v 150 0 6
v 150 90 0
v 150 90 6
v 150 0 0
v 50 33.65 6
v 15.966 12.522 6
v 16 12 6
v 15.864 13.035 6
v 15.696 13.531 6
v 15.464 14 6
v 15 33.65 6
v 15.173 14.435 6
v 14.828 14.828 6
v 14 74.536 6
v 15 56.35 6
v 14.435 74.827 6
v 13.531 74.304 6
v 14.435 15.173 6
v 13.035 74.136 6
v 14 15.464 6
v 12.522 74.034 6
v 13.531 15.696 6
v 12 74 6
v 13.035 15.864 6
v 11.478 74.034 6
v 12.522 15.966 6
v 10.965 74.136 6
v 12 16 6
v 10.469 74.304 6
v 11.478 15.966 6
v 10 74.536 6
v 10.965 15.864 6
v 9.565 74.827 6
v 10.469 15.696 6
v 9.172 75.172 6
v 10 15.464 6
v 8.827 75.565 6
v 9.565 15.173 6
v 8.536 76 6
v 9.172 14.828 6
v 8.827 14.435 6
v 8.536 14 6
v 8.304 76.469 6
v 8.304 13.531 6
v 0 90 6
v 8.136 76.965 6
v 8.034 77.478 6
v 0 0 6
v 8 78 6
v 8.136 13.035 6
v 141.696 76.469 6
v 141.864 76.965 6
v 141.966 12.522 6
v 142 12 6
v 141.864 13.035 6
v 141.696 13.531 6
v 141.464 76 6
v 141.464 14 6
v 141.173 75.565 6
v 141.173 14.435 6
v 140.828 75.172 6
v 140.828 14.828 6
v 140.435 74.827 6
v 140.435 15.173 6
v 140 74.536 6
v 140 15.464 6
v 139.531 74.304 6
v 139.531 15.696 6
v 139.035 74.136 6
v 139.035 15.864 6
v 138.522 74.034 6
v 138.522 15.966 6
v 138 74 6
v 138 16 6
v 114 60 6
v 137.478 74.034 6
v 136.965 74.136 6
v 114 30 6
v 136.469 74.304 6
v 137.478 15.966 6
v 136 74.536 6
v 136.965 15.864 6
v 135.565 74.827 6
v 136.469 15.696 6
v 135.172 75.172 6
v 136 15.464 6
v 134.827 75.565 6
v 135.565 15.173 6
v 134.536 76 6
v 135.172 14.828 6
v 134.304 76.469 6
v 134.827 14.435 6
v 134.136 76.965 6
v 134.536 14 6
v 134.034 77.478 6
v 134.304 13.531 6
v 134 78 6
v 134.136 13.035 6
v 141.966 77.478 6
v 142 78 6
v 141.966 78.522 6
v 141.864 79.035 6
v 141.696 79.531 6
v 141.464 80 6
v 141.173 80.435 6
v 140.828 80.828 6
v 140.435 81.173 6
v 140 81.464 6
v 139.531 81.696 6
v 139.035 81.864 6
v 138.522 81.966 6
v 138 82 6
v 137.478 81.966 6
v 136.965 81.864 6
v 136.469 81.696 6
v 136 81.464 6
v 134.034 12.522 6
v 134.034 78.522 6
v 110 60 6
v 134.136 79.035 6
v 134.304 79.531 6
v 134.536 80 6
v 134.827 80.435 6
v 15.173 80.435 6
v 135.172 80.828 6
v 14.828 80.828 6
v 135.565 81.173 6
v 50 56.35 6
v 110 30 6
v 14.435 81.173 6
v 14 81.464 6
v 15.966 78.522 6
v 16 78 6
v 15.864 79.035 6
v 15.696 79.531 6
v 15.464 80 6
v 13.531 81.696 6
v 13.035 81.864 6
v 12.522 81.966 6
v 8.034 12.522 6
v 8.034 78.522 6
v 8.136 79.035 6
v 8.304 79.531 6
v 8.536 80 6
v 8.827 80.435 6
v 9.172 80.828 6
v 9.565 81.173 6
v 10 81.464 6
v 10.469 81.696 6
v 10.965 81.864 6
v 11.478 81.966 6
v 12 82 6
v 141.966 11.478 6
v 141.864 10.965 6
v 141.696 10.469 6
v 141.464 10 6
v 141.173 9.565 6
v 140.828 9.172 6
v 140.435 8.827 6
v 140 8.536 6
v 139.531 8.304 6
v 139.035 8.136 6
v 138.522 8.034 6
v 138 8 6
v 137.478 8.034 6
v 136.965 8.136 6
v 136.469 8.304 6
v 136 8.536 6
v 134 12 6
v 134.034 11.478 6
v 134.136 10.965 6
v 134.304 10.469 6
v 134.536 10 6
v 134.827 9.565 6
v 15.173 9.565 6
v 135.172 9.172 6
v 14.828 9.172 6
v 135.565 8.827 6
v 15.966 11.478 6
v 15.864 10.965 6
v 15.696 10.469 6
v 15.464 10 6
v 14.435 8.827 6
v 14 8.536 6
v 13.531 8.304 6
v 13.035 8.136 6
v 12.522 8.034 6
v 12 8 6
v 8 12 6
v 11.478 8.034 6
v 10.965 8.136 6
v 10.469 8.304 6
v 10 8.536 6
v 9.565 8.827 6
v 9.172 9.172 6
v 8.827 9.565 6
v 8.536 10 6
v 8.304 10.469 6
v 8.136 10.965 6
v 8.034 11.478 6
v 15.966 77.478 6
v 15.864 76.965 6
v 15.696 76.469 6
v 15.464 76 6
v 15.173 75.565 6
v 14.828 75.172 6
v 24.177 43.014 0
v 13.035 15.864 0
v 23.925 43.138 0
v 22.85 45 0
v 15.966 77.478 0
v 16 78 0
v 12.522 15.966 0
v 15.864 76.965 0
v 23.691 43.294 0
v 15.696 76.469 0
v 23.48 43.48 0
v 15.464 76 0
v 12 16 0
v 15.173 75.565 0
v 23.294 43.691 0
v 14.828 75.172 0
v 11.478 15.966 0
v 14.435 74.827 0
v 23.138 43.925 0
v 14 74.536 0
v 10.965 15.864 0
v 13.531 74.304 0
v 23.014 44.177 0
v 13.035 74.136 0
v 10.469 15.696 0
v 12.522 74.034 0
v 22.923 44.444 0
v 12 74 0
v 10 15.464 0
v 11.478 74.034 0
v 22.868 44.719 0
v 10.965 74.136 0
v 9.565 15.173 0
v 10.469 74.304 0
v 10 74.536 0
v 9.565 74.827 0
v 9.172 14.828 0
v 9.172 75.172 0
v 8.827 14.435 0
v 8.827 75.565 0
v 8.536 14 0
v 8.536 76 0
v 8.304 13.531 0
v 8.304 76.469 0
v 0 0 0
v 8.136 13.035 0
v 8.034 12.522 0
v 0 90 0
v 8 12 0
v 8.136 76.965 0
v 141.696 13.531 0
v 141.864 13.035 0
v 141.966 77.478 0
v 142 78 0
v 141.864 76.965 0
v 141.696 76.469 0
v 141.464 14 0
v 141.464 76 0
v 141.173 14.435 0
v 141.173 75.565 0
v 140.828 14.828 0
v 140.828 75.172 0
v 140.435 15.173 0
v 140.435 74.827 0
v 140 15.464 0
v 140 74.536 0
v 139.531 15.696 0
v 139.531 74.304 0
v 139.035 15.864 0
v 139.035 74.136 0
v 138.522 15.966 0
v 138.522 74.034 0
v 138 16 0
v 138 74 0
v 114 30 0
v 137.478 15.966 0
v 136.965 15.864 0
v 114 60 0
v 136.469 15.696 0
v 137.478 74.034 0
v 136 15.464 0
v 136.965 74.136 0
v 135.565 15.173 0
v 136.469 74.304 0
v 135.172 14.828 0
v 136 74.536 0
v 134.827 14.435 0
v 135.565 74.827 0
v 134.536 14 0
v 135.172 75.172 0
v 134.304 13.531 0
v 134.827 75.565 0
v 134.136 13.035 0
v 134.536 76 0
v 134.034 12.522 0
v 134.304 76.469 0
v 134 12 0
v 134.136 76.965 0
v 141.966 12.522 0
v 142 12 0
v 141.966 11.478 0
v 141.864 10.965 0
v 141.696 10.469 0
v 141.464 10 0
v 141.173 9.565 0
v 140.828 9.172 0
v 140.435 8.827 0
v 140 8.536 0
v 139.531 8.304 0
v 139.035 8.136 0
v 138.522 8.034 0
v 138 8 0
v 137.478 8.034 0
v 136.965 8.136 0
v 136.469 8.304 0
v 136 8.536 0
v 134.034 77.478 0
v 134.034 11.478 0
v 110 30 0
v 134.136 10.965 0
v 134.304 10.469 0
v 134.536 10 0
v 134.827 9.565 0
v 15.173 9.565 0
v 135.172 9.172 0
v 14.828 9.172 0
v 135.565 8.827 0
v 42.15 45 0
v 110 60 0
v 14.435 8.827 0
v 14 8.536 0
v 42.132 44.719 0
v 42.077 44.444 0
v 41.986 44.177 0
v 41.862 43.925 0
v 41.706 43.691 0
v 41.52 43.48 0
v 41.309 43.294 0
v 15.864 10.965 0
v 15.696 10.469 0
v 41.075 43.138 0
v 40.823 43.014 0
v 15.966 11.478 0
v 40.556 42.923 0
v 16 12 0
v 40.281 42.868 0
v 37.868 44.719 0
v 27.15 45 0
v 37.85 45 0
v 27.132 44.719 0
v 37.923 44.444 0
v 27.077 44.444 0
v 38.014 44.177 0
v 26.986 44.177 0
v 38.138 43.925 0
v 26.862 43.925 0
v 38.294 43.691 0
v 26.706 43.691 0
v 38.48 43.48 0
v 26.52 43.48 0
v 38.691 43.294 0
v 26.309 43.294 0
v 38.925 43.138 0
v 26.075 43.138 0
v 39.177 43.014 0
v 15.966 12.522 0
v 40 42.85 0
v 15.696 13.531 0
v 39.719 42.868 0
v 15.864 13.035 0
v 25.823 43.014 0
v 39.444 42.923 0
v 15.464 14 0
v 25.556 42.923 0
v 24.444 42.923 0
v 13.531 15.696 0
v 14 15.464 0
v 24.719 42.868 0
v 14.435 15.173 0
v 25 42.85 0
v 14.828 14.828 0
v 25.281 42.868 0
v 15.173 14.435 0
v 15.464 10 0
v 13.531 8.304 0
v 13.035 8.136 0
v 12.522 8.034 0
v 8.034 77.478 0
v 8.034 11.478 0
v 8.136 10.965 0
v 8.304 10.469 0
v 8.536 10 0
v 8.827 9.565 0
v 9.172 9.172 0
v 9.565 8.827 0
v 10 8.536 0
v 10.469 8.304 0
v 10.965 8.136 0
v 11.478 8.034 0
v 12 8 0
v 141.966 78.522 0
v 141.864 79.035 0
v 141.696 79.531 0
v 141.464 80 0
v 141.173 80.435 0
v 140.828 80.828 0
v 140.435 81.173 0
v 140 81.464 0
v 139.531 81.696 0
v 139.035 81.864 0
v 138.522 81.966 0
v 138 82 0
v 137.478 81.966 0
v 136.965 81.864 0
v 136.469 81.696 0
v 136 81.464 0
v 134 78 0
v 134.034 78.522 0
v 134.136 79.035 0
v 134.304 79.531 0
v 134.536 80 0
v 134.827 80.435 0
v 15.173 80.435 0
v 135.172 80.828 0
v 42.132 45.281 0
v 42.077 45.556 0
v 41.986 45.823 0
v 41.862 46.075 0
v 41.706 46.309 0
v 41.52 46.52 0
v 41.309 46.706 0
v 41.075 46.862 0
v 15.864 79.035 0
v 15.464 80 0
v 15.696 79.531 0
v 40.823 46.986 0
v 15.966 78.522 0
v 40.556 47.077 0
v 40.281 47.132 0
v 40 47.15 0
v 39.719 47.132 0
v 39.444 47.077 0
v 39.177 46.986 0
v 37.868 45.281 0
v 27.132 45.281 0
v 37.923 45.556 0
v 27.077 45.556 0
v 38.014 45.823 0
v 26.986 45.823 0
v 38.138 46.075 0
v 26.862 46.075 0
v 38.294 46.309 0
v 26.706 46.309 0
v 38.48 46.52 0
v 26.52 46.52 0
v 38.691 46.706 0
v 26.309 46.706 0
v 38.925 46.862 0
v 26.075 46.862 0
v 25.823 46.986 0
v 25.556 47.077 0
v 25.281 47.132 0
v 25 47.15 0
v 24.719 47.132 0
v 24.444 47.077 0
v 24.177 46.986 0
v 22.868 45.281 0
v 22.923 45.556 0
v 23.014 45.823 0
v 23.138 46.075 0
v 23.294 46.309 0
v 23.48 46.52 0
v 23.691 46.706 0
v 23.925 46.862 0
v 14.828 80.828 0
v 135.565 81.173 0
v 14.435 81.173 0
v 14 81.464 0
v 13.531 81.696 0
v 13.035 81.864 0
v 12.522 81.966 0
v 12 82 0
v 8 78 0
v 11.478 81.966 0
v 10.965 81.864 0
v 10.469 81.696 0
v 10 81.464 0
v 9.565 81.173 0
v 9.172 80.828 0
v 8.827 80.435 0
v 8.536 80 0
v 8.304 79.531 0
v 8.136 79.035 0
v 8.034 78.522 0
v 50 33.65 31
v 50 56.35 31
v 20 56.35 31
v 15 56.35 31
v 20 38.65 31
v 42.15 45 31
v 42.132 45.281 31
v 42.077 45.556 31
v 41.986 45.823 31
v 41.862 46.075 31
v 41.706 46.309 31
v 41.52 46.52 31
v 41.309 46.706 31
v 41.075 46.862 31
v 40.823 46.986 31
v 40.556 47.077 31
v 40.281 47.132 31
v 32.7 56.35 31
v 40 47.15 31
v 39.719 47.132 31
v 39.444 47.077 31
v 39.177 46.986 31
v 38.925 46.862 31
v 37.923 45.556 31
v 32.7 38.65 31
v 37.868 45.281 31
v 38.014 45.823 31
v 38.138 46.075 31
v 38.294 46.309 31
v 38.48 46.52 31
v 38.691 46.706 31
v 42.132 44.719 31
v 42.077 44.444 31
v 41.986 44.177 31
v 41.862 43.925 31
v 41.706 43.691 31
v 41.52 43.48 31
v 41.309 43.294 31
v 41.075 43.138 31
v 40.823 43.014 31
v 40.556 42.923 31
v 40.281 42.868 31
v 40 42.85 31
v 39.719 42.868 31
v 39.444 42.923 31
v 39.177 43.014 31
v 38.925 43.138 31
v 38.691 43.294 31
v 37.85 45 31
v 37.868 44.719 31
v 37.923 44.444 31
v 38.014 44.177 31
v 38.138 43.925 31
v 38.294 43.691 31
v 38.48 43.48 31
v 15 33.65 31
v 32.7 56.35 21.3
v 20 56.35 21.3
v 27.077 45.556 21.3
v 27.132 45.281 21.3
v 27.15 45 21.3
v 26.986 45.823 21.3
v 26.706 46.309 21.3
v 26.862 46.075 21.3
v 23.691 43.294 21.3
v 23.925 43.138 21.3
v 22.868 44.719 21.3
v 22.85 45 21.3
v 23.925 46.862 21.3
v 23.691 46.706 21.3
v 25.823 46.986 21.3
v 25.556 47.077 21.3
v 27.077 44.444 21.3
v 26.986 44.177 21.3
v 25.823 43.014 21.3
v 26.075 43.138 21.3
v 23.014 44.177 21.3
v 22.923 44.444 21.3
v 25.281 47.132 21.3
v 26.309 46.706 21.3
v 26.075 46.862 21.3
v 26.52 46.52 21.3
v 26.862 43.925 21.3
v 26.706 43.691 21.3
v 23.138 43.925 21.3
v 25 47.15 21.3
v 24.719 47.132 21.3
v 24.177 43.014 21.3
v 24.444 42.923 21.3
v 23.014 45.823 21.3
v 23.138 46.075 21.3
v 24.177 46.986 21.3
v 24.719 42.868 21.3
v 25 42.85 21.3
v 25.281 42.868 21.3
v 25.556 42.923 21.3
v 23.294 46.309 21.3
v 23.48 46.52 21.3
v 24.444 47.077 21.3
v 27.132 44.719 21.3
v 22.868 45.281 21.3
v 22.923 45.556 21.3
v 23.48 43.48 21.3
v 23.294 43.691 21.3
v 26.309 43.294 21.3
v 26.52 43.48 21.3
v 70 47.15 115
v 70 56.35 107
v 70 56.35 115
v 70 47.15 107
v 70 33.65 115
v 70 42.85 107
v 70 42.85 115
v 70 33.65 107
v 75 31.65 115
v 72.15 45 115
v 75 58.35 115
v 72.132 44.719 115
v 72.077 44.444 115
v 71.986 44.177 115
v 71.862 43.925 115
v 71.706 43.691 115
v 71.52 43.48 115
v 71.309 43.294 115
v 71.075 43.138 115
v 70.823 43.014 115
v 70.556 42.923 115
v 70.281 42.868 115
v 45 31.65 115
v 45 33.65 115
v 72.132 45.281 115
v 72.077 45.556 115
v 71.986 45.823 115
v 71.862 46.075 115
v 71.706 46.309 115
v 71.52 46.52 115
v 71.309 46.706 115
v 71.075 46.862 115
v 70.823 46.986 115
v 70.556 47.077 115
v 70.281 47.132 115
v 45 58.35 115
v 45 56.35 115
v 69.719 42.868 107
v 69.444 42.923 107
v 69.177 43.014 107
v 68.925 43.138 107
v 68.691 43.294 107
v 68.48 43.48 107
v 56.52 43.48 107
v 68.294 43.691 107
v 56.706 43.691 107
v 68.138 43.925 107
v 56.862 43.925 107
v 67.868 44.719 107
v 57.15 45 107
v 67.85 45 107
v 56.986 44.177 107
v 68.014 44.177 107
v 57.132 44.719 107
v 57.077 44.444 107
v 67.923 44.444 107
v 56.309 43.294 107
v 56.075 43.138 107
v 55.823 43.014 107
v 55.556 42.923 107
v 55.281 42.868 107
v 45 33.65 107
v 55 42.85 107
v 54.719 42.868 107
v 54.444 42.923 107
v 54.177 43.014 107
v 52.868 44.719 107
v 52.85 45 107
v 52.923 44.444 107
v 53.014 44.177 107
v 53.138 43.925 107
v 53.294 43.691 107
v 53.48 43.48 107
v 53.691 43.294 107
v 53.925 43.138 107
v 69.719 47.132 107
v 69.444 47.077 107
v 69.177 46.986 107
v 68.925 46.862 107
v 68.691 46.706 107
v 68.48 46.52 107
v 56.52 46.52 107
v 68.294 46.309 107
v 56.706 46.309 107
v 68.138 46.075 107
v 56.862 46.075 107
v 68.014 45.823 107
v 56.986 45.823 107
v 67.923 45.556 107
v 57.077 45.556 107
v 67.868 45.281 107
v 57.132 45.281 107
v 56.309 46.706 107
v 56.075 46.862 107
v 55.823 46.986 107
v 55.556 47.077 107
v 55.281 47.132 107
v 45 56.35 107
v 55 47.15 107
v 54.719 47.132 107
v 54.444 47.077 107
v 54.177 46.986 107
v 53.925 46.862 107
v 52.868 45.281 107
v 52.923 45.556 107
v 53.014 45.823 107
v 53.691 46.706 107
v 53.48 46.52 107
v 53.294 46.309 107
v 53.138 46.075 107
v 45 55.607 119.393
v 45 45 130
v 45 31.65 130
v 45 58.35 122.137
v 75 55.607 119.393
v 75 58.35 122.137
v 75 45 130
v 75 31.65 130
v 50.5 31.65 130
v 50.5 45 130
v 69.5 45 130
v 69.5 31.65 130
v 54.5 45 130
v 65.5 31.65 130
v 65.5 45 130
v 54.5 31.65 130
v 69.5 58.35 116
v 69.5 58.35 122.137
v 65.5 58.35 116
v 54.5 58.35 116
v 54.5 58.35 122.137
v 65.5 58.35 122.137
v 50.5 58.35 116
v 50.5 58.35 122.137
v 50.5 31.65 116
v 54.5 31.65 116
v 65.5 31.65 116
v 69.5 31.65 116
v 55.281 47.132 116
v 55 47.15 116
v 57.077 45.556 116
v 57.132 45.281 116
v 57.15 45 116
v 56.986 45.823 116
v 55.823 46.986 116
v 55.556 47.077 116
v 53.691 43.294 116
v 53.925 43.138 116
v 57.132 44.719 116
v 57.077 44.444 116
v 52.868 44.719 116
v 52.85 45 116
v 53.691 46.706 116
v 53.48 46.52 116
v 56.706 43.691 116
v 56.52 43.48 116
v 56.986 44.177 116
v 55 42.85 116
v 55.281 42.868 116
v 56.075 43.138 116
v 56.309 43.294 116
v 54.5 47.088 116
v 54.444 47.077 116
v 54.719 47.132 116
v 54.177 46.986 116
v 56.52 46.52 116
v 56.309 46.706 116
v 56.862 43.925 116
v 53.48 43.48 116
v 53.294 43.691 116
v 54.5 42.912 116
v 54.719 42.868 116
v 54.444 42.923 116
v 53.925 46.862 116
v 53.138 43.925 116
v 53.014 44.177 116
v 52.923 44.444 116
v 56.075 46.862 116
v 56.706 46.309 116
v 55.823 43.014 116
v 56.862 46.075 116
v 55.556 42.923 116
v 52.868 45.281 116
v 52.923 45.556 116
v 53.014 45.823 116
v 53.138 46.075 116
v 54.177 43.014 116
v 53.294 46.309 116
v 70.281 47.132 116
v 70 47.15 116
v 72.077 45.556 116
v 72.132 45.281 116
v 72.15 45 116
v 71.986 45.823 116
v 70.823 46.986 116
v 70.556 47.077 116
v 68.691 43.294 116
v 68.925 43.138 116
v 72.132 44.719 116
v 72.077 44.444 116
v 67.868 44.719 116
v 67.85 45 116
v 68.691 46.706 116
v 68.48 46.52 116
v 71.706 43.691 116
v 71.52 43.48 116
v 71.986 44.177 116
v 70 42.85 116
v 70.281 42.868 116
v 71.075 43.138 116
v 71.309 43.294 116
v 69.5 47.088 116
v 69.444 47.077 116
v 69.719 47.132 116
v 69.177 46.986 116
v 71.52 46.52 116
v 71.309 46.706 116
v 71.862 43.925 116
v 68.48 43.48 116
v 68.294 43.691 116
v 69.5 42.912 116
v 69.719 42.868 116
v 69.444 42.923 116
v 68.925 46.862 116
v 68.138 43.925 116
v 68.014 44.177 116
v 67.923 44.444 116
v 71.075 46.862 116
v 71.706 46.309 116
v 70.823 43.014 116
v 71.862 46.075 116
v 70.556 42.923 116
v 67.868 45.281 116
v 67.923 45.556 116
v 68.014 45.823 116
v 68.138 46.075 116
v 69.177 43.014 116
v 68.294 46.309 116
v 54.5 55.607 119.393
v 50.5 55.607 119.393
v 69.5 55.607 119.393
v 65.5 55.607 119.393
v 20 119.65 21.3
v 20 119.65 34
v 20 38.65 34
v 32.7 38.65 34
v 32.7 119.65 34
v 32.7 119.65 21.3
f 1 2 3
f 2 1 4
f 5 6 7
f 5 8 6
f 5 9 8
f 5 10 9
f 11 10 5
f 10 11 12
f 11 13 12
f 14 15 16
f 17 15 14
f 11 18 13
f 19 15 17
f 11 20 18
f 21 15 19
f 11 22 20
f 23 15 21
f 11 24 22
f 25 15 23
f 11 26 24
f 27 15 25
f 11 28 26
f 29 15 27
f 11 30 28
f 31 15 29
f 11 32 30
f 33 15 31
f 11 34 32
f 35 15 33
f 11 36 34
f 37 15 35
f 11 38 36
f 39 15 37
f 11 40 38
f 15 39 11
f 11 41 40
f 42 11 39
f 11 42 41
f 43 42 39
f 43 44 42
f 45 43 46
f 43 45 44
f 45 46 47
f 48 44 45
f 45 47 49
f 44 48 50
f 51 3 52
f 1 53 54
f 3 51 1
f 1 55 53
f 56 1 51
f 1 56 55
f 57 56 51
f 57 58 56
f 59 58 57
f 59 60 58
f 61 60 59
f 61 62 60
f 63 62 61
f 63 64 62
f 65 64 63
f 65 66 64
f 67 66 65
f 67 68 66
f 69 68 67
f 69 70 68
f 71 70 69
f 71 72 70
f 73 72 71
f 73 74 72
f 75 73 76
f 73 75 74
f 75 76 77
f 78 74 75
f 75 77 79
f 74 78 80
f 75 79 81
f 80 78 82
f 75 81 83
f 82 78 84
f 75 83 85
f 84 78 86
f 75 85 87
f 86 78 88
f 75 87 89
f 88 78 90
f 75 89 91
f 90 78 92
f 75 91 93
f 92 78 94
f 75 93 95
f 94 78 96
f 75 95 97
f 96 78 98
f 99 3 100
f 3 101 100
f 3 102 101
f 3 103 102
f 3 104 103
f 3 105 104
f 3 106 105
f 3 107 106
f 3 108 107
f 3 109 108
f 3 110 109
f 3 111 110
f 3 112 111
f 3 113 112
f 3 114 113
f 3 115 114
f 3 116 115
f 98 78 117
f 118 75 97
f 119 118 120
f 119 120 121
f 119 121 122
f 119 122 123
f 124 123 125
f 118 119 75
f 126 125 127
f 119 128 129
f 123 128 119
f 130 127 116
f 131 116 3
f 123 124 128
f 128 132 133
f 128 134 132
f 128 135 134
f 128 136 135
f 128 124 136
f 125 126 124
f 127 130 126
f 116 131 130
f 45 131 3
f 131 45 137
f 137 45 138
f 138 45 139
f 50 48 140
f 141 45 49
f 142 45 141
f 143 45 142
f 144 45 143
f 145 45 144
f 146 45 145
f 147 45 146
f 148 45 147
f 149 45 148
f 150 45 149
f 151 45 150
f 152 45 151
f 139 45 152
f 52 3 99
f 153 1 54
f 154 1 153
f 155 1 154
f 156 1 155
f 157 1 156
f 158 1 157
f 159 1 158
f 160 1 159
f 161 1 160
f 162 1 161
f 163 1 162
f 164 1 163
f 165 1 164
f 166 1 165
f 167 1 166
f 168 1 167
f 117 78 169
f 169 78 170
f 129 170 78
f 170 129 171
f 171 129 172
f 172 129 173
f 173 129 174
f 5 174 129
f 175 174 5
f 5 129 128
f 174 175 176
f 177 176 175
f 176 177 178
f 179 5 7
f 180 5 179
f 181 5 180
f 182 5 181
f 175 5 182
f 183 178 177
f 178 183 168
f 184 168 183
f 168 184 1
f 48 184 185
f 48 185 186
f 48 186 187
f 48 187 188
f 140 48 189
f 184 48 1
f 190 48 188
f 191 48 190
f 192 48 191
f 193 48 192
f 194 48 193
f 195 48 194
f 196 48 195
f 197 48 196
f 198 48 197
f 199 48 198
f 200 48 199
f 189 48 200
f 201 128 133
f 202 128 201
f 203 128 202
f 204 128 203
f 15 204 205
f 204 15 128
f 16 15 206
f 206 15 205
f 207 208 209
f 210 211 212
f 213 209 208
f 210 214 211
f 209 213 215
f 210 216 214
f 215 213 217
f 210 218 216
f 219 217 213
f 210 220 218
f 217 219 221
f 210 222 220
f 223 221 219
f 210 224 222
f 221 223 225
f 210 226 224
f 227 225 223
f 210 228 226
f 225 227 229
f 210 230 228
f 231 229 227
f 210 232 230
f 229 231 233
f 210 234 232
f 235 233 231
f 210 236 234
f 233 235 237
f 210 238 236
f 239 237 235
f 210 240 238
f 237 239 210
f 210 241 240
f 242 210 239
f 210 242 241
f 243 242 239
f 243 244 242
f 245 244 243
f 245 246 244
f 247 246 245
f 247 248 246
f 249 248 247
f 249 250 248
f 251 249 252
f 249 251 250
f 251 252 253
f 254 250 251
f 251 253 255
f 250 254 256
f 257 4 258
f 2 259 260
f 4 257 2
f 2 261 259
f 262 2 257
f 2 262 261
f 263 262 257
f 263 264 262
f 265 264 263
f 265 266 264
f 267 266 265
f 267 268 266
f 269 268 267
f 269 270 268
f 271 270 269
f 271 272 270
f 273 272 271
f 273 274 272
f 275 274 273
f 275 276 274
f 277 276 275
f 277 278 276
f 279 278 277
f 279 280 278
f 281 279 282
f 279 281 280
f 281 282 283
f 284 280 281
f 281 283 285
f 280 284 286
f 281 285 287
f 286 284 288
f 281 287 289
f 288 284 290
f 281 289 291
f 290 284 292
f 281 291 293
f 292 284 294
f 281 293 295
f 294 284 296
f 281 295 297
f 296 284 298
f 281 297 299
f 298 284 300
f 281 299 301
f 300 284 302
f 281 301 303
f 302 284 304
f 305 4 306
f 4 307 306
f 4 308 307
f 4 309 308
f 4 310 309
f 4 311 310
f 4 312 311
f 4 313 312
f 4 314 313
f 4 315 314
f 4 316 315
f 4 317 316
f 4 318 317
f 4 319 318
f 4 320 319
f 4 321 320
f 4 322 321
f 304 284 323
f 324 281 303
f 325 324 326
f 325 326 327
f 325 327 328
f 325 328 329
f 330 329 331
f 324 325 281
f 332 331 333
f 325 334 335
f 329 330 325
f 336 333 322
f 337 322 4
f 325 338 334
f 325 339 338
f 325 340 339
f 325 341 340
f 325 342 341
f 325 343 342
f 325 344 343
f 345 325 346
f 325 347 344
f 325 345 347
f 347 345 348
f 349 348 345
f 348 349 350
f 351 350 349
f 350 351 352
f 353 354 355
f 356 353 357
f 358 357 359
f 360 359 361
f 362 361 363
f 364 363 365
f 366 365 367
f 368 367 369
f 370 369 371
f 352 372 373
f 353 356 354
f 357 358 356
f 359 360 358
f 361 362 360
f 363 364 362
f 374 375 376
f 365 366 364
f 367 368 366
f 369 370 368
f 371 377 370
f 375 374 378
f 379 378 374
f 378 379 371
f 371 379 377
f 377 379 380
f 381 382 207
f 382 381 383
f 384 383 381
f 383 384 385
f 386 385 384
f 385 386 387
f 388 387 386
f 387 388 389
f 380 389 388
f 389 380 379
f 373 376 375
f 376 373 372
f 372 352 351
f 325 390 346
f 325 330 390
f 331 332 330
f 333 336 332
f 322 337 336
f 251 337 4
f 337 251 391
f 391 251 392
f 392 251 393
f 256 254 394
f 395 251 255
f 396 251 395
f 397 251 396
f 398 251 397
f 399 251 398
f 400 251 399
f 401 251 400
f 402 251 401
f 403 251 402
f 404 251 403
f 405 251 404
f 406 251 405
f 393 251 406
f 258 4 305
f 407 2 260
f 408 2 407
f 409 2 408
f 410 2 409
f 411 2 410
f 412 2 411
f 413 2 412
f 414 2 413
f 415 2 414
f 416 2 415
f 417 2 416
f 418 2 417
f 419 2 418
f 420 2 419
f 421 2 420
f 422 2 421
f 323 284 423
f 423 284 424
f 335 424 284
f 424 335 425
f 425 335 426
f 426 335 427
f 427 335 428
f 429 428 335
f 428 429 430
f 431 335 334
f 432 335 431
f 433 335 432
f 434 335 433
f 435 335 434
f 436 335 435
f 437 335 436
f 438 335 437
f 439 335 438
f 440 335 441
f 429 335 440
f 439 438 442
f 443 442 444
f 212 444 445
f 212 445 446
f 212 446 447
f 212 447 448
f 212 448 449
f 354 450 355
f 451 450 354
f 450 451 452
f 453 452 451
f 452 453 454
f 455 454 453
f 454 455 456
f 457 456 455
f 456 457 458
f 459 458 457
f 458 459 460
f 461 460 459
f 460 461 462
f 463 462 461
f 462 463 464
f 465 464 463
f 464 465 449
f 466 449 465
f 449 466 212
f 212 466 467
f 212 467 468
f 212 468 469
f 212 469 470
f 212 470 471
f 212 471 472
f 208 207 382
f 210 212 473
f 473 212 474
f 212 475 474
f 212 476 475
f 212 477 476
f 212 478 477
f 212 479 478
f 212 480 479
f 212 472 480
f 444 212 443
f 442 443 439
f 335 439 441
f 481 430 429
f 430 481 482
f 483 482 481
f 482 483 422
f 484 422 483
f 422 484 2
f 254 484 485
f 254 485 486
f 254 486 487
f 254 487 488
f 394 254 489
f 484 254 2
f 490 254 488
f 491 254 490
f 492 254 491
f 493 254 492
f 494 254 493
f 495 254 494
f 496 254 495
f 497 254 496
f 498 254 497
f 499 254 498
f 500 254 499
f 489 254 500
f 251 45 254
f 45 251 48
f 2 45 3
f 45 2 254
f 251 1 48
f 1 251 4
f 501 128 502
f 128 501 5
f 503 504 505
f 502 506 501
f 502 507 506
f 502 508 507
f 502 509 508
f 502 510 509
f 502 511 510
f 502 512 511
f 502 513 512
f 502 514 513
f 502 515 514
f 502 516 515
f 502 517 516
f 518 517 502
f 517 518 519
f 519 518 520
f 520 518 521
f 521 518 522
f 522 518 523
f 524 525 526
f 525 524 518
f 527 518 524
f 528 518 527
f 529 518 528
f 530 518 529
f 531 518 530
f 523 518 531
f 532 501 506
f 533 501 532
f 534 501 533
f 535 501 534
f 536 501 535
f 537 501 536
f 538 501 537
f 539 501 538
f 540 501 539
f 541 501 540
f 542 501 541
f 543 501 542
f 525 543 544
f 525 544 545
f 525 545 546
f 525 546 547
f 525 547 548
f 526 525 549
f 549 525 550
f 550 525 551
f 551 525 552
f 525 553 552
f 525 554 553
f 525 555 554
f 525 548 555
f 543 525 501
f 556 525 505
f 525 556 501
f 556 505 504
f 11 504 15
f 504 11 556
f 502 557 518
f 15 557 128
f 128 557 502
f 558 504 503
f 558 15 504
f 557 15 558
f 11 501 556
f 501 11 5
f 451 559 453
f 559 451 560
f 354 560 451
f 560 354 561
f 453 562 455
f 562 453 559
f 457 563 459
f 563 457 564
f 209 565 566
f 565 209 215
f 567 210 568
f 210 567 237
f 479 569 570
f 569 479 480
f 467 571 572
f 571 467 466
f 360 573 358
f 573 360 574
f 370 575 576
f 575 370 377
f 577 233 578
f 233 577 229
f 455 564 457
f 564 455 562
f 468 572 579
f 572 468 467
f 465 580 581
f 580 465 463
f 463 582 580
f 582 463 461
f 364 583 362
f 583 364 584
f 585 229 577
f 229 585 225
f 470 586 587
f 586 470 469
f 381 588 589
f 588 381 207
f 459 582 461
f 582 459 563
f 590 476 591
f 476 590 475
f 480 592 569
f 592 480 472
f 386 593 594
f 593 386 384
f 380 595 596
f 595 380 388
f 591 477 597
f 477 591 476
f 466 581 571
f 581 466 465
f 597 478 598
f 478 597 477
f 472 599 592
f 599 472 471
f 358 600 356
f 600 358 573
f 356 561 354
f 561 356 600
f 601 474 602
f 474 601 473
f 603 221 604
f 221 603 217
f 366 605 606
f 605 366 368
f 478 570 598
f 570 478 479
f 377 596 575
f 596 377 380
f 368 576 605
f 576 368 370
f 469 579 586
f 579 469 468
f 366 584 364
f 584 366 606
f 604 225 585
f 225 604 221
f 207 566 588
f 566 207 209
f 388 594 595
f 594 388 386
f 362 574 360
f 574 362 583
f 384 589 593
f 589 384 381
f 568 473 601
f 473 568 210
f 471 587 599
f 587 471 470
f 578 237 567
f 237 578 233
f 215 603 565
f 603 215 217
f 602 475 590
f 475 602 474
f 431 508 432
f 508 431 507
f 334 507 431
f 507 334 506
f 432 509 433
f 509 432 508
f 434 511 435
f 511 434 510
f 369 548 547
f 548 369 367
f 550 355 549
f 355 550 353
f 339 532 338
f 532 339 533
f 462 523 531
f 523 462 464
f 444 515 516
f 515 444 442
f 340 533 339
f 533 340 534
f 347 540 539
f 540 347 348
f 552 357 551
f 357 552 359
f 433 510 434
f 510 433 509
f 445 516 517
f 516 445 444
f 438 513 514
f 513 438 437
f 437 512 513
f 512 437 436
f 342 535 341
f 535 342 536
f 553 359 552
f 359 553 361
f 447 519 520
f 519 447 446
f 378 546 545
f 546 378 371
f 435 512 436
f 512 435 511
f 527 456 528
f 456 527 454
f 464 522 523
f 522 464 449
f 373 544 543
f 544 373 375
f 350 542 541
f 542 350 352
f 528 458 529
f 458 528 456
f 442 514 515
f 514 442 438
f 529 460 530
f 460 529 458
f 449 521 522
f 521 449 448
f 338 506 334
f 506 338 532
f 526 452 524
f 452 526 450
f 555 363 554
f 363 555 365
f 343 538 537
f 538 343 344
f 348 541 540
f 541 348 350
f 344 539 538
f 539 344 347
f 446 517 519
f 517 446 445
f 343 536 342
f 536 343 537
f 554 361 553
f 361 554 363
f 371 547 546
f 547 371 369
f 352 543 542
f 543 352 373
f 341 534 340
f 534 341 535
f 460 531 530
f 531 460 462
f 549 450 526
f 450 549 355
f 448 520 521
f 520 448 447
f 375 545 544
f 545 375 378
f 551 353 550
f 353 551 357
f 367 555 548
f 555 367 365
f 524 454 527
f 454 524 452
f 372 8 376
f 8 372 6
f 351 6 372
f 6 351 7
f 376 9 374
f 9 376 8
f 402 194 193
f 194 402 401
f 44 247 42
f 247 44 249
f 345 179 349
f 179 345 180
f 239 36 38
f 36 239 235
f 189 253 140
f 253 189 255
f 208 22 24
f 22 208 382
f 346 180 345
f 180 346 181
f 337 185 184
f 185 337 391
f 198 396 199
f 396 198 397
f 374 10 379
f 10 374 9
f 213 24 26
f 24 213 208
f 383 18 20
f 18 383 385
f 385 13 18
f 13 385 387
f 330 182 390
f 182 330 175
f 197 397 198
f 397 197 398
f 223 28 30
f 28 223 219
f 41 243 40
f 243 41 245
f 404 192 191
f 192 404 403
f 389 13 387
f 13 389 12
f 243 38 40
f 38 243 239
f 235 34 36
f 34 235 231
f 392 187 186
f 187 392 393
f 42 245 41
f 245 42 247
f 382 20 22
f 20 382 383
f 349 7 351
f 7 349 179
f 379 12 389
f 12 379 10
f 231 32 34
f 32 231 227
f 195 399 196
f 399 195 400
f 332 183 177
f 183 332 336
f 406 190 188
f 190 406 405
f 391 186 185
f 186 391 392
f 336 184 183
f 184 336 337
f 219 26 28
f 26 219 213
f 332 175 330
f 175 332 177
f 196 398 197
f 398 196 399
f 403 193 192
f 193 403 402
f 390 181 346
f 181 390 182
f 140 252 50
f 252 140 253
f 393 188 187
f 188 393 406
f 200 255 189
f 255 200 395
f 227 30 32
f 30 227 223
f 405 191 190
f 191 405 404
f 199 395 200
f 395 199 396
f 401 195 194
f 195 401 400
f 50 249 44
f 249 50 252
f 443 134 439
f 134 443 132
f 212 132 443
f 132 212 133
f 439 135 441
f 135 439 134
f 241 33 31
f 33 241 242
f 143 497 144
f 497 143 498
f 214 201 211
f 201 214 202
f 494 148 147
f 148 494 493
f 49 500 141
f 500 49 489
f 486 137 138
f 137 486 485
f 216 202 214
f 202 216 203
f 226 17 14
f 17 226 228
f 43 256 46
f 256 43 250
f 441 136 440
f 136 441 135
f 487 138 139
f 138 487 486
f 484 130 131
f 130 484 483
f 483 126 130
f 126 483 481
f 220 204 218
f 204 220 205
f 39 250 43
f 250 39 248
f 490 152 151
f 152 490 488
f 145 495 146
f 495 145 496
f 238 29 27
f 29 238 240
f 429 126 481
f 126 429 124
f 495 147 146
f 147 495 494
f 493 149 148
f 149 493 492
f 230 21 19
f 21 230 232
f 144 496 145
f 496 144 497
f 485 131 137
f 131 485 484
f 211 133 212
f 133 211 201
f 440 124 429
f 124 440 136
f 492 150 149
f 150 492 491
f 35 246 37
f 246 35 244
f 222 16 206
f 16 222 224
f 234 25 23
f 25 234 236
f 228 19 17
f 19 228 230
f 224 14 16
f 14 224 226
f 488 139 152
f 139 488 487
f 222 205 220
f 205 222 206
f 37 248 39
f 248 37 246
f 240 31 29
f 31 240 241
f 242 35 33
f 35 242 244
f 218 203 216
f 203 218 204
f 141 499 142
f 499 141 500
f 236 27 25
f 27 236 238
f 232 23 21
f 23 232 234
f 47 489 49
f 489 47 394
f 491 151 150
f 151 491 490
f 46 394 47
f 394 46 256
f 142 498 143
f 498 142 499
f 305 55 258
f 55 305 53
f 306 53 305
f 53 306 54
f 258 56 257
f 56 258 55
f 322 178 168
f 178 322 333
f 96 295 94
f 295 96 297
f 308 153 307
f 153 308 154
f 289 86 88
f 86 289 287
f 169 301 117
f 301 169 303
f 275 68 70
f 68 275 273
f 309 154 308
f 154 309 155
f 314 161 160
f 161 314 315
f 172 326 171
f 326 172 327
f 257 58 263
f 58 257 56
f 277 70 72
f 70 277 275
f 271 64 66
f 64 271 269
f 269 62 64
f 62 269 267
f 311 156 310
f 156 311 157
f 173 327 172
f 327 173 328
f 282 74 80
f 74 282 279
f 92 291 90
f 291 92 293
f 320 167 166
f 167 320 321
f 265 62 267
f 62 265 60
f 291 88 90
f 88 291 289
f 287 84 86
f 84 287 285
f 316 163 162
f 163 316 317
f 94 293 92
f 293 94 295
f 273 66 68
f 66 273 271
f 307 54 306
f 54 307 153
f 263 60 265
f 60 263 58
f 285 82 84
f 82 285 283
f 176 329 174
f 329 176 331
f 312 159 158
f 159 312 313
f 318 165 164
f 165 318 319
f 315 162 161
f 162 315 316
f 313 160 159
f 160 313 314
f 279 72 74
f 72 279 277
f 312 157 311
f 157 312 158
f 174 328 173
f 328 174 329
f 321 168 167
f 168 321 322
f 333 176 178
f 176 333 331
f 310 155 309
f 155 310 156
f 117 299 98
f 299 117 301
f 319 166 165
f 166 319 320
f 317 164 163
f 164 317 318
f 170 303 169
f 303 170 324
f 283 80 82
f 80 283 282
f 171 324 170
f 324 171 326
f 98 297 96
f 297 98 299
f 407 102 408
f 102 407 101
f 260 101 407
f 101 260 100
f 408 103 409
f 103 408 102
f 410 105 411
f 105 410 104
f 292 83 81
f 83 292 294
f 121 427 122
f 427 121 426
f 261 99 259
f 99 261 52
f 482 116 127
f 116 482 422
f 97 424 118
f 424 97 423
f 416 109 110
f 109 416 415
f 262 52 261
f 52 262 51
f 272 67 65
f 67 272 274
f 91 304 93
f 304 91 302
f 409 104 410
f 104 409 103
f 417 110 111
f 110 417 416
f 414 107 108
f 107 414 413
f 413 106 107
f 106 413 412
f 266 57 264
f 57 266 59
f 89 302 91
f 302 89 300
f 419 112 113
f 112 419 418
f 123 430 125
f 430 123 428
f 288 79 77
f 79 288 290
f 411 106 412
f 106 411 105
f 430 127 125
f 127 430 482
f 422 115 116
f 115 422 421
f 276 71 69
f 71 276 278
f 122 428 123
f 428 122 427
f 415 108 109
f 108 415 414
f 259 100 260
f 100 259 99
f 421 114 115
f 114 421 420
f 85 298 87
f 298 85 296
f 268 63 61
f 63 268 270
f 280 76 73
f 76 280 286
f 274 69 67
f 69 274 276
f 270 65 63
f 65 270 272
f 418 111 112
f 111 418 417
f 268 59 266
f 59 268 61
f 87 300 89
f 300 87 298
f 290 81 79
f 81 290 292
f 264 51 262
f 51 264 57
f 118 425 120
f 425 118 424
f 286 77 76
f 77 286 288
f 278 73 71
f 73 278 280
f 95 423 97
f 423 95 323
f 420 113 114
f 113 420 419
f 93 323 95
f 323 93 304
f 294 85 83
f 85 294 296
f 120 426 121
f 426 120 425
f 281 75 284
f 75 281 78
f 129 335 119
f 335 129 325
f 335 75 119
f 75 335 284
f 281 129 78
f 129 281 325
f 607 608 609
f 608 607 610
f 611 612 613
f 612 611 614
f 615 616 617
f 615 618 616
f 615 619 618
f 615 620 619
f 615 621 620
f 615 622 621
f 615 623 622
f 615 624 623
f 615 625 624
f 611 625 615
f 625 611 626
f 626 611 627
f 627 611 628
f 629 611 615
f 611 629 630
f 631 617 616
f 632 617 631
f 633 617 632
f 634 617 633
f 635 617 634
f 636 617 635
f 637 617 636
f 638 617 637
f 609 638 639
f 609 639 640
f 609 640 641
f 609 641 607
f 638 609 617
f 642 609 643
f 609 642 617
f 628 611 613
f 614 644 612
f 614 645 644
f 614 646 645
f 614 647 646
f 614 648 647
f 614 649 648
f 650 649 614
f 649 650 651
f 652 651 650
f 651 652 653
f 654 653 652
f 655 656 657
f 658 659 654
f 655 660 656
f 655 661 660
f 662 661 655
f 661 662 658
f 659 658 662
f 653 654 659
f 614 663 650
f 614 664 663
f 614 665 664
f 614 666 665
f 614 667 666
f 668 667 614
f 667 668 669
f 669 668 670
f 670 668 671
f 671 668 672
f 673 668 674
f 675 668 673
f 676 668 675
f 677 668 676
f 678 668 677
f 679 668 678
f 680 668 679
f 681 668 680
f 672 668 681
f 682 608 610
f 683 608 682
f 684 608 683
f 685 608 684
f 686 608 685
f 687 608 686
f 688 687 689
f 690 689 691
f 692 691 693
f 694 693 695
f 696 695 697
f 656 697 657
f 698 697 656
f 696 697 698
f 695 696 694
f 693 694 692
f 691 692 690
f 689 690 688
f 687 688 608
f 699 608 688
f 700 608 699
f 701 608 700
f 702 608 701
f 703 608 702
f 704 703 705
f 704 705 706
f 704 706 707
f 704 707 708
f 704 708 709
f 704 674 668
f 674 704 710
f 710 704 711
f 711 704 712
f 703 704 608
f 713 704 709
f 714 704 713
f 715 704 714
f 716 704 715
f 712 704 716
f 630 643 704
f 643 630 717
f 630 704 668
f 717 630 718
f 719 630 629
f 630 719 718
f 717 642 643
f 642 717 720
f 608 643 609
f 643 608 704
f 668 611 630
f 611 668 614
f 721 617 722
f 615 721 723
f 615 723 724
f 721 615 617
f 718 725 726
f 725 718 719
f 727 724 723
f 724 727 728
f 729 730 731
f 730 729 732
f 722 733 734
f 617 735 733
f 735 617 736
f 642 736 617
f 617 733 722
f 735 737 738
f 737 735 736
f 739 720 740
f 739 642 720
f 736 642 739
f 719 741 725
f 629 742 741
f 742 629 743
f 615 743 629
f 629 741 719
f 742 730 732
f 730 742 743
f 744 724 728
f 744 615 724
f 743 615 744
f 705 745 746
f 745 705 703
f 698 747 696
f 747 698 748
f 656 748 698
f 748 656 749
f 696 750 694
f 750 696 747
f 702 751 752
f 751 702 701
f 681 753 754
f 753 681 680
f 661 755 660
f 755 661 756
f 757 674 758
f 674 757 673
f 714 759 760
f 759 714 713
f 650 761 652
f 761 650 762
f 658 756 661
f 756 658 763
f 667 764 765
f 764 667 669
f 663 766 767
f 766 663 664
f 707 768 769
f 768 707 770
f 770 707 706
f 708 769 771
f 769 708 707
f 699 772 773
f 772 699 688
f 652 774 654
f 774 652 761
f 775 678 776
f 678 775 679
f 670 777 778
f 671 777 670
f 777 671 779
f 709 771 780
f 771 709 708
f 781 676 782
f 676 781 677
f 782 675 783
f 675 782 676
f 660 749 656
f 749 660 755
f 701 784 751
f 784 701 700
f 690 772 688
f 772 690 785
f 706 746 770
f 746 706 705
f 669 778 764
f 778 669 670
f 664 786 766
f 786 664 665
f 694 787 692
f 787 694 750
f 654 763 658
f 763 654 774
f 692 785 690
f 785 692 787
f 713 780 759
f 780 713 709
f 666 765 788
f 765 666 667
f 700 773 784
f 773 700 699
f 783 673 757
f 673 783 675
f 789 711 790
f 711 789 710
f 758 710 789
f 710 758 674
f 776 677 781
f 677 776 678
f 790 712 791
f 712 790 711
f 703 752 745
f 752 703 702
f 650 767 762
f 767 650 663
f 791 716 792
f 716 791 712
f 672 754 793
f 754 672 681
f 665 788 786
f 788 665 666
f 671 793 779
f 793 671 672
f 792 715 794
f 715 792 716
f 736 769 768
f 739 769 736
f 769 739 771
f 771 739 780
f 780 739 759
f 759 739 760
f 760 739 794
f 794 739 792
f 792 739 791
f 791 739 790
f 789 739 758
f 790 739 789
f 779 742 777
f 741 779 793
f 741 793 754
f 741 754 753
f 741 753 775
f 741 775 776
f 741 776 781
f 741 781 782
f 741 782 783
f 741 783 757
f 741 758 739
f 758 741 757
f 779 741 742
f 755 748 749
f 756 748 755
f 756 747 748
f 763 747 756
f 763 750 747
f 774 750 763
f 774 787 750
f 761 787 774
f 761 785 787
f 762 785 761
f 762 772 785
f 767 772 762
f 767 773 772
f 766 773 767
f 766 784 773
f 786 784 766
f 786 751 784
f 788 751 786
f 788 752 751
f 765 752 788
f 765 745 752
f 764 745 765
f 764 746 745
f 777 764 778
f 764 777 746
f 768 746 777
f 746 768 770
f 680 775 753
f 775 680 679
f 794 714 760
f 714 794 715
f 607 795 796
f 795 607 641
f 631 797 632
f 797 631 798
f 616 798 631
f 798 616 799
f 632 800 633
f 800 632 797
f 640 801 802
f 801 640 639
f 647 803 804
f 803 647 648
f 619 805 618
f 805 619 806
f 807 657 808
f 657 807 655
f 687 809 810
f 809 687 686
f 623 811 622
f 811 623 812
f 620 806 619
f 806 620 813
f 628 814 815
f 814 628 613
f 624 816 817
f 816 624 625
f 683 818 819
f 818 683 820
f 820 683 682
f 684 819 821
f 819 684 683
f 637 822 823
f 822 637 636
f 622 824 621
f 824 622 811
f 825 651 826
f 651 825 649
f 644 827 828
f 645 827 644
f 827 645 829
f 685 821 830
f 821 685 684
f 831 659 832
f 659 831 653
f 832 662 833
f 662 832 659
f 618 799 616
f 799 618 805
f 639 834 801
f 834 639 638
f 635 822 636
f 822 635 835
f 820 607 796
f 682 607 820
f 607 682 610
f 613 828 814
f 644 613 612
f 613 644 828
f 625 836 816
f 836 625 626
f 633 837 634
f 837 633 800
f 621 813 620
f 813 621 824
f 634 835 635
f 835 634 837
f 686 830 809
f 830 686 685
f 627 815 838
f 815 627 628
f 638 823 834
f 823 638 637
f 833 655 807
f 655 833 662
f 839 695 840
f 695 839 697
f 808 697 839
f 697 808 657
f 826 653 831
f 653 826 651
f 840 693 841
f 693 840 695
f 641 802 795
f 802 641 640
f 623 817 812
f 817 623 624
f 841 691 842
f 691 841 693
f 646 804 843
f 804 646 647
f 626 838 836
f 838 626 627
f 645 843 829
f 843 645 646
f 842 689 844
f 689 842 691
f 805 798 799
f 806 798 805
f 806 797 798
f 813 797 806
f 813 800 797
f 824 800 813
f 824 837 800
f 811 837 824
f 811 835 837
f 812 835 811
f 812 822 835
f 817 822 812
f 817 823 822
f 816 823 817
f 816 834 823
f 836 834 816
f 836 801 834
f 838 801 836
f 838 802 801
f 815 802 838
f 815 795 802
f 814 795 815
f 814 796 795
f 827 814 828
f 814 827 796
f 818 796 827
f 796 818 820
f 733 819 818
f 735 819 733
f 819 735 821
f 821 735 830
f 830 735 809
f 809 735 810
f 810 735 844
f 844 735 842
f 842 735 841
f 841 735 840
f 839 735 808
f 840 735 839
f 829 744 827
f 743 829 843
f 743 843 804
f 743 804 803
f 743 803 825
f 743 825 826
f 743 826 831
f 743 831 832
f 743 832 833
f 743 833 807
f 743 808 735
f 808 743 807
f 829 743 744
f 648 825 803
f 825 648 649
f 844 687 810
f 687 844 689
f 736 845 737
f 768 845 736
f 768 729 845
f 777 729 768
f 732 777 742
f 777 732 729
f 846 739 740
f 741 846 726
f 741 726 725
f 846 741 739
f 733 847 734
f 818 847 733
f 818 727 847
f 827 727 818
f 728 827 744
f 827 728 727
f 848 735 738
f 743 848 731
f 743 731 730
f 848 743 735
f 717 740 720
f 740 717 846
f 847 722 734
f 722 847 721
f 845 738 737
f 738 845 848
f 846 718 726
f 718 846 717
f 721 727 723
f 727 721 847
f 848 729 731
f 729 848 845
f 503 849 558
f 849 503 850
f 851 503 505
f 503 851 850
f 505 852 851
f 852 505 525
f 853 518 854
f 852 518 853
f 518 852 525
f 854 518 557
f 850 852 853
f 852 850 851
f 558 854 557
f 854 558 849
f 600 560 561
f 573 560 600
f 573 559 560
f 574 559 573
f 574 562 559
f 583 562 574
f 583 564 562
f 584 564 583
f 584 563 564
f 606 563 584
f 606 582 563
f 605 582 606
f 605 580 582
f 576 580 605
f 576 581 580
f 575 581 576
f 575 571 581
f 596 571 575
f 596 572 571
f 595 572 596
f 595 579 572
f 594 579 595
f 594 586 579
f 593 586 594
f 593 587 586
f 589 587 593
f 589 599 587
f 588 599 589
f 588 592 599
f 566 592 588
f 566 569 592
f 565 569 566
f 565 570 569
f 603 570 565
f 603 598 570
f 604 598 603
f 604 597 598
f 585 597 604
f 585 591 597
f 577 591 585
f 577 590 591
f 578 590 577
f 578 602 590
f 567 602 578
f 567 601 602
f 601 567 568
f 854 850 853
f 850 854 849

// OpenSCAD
// =====================================================
// 냉가스 리펄서 - 1단계 추력 측정 리그 마운트
// OpenSCAD 파라메트릭 설계
//
// 사용법:
//  1. 로드셀 도착하면 아래 [실측 필요] 값들을 실측치로 수정
//  2. part 변수를 바꿔가며 각 부품 렌더(F6) -> STL 내보내기
//  3. PETG, 레이어 0.2, 인필 40%, 퍼리미터 4 권장
//
// 부품 구성:
//  part = "base"    베이스 + 로드셀 포스트 (클램프 날개 포함)
//  part = "bracket" 노즐 브래킷 (로드셀 자유단에 볼트 고정)
//  part = "spacer"  로드셀 스페이서 2개 (고정단/자유단용)
//  part = "all"     조립 미리보기
// =====================================================

part = "all"; // [base, bracket, spacer, all]

// ---------- 로드셀 치수 [실측 필요] ----------
lc_len        = 81;    // 로드셀 전체 길이
lc_w          = 12.7;  // 폭
lc_h          = 12.7;  // 두께
lc_hole_d     = 4.3;   // M4 볼트 통과 구멍
lc_hole_pitch = 15;    // 같은 쪽 구멍 2개 간격 [실측 필요]
lc_hole_end   = 5;     // 끝면에서 첫 구멍까지 [실측 필요]

// ---------- 노즐 어셈블리 치수 [실측 필요] ----------
fit_d   = 15;   // 황동 피팅/캡너트 육각 대각 지름 (V홈 크기)
fit_len = 30;   // 브래킷이 감싸는 길이

// ---------- 베이스 ----------
base_l  = 150;
base_w  = 90;
base_t  = 6;
post_h  = 25;   // 포스트 높이 (로드셀 고정단이 이 위에 앉음)
post_l  = 25;   // 포스트 길이 (로드셀 고정단 구멍 2개 커버)
clamp_hole = 8; // 클램프/볼트 고정용 구멍

spacer_t = 3;   // 로드셀 스페이서 두께 (막대 휨 공간)

$fn = 48;
bolt = 4.3;

// ---------- 모듈 ----------

module base() {
    difference() {
        union() {
            // 바닥판
            cube([base_l, base_w, base_t]);
            // 로드셀 포스트: 판 끝쪽에 배치
            translate([15, base_w/2 - lc_w/2 - 5, 0])
                cube([post_l + 10, lc_w + 10, base_t + post_h]);
        }
        // 로드셀 고정 볼트 구멍 2개 (포스트 상면, 수직 관통)
        for (i = [0, 1])
            translate([20 + lc_hole_end + i*lc_hole_pitch,
                       base_w/2, -1])
                cylinder(d = bolt, h = base_t + post_h + 2);
        // 클램프/책상 고정 구멍 4개
        for (x = [12, base_l - 12], y = [12, base_w - 12])
            translate([x, y, -1]) cylinder(d = clamp_hole, h = base_t + 2);
        // 케이블타이 슬롯 (HX711 배선 정리)
        translate([base_l - 40, base_w/2 - 15, -1]) cube([4, 30, base_t + 2]);
    }
}

module spacer() {
    difference() {
        cube([post_l, lc_w, spacer_t]);
        for (i = [0, 1])
            translate([lc_hole_end + i*lc_hole_pitch - 5 + 10, lc_w/2, -1])
                cylinder(d = bolt, h = spacer_t + 2);
    }
}

module bracket() {
    br_l = fit_len;
    br_w = lc_w + 10;
    br_t = 8;
    difference() {
        union() {
            // 로드셀 자유단에 앉는 판
            cube([post_l, br_w, br_t]);
            // V홈 블록 (노즐 피팅이 눕는 자리, 분사 방향 = +Y)
            translate([0, -2, br_t])
                cube([br_l, br_w + 4, fit_d]);
        }
        // 로드셀 볼트 구멍 2개
        for (i = [0, 1])
            translate([lc_hole_end + i*lc_hole_pitch - 5 + 10, br_w/2, -1])
                cylinder(d = bolt, h = br_t + 2);
        // V홈 (90도, 피팅이 안착)
        translate([-1, br_w/2, br_t + fit_d])
            rotate([0, 90, 0])
                rotate([0, 0, 45])
                    cube([fit_d, fit_d, br_l + 2]);
        // 케이블타이 슬롯 2개
        for (x = [br_l*0.25, br_l*0.75])
            translate([x - 2, -3, br_t + 1])
                cube([4, br_w + 6, fit_d + 2]);
    }
}

module loadcell_dummy() {
    color("silver") cube([lc_len, lc_w, lc_h]);
}

// ---------- 렌더 ----------
if (part == "base") base();
if (part == "spacer") { spacer(); translate([post_l + 5, 0, 0]) spacer(); }
if (part == "bracket") bracket();
if (part == "all") {
    base();
    // 로드셀: 포스트 위에 수직으로 세움 (미리보기용, 대략 배치)
    translate([20, base_w/2 - lc_h/2, base_t + post_h + spacer_t])
        rotate([0, -90, 0]) rotate([0, 0, 90])
            translate([0, 0, -lc_w]) loadcell_dummy();
    // 브래킷: 로드셀 상단 자유단 위치 (대략 배치)
    translate([45, base_w/2 - (lc_w+10)/2, base_t + post_h + lc_len - 5])
        bracket();
}

// =====================================================
// 조립 노트
// - 로드셀 화살표(있으면)가 분사 반대 방향을 가리키게
// - 고정단: 베이스 포스트 + 스페이서 + 로드셀, M4x25 볼트 2개
// - 자유단: 로드셀 + 스페이서 + 브래킷, M4x20 볼트 2개
// - 캘리브레이션은 조립 전에 수평 상태로 (c500), 조립 후 tare만
// - 분사 방향(+Y)이 브래킷 V홈 축과 일치, 벽/사람 없는 쪽으로
// =====================================================
